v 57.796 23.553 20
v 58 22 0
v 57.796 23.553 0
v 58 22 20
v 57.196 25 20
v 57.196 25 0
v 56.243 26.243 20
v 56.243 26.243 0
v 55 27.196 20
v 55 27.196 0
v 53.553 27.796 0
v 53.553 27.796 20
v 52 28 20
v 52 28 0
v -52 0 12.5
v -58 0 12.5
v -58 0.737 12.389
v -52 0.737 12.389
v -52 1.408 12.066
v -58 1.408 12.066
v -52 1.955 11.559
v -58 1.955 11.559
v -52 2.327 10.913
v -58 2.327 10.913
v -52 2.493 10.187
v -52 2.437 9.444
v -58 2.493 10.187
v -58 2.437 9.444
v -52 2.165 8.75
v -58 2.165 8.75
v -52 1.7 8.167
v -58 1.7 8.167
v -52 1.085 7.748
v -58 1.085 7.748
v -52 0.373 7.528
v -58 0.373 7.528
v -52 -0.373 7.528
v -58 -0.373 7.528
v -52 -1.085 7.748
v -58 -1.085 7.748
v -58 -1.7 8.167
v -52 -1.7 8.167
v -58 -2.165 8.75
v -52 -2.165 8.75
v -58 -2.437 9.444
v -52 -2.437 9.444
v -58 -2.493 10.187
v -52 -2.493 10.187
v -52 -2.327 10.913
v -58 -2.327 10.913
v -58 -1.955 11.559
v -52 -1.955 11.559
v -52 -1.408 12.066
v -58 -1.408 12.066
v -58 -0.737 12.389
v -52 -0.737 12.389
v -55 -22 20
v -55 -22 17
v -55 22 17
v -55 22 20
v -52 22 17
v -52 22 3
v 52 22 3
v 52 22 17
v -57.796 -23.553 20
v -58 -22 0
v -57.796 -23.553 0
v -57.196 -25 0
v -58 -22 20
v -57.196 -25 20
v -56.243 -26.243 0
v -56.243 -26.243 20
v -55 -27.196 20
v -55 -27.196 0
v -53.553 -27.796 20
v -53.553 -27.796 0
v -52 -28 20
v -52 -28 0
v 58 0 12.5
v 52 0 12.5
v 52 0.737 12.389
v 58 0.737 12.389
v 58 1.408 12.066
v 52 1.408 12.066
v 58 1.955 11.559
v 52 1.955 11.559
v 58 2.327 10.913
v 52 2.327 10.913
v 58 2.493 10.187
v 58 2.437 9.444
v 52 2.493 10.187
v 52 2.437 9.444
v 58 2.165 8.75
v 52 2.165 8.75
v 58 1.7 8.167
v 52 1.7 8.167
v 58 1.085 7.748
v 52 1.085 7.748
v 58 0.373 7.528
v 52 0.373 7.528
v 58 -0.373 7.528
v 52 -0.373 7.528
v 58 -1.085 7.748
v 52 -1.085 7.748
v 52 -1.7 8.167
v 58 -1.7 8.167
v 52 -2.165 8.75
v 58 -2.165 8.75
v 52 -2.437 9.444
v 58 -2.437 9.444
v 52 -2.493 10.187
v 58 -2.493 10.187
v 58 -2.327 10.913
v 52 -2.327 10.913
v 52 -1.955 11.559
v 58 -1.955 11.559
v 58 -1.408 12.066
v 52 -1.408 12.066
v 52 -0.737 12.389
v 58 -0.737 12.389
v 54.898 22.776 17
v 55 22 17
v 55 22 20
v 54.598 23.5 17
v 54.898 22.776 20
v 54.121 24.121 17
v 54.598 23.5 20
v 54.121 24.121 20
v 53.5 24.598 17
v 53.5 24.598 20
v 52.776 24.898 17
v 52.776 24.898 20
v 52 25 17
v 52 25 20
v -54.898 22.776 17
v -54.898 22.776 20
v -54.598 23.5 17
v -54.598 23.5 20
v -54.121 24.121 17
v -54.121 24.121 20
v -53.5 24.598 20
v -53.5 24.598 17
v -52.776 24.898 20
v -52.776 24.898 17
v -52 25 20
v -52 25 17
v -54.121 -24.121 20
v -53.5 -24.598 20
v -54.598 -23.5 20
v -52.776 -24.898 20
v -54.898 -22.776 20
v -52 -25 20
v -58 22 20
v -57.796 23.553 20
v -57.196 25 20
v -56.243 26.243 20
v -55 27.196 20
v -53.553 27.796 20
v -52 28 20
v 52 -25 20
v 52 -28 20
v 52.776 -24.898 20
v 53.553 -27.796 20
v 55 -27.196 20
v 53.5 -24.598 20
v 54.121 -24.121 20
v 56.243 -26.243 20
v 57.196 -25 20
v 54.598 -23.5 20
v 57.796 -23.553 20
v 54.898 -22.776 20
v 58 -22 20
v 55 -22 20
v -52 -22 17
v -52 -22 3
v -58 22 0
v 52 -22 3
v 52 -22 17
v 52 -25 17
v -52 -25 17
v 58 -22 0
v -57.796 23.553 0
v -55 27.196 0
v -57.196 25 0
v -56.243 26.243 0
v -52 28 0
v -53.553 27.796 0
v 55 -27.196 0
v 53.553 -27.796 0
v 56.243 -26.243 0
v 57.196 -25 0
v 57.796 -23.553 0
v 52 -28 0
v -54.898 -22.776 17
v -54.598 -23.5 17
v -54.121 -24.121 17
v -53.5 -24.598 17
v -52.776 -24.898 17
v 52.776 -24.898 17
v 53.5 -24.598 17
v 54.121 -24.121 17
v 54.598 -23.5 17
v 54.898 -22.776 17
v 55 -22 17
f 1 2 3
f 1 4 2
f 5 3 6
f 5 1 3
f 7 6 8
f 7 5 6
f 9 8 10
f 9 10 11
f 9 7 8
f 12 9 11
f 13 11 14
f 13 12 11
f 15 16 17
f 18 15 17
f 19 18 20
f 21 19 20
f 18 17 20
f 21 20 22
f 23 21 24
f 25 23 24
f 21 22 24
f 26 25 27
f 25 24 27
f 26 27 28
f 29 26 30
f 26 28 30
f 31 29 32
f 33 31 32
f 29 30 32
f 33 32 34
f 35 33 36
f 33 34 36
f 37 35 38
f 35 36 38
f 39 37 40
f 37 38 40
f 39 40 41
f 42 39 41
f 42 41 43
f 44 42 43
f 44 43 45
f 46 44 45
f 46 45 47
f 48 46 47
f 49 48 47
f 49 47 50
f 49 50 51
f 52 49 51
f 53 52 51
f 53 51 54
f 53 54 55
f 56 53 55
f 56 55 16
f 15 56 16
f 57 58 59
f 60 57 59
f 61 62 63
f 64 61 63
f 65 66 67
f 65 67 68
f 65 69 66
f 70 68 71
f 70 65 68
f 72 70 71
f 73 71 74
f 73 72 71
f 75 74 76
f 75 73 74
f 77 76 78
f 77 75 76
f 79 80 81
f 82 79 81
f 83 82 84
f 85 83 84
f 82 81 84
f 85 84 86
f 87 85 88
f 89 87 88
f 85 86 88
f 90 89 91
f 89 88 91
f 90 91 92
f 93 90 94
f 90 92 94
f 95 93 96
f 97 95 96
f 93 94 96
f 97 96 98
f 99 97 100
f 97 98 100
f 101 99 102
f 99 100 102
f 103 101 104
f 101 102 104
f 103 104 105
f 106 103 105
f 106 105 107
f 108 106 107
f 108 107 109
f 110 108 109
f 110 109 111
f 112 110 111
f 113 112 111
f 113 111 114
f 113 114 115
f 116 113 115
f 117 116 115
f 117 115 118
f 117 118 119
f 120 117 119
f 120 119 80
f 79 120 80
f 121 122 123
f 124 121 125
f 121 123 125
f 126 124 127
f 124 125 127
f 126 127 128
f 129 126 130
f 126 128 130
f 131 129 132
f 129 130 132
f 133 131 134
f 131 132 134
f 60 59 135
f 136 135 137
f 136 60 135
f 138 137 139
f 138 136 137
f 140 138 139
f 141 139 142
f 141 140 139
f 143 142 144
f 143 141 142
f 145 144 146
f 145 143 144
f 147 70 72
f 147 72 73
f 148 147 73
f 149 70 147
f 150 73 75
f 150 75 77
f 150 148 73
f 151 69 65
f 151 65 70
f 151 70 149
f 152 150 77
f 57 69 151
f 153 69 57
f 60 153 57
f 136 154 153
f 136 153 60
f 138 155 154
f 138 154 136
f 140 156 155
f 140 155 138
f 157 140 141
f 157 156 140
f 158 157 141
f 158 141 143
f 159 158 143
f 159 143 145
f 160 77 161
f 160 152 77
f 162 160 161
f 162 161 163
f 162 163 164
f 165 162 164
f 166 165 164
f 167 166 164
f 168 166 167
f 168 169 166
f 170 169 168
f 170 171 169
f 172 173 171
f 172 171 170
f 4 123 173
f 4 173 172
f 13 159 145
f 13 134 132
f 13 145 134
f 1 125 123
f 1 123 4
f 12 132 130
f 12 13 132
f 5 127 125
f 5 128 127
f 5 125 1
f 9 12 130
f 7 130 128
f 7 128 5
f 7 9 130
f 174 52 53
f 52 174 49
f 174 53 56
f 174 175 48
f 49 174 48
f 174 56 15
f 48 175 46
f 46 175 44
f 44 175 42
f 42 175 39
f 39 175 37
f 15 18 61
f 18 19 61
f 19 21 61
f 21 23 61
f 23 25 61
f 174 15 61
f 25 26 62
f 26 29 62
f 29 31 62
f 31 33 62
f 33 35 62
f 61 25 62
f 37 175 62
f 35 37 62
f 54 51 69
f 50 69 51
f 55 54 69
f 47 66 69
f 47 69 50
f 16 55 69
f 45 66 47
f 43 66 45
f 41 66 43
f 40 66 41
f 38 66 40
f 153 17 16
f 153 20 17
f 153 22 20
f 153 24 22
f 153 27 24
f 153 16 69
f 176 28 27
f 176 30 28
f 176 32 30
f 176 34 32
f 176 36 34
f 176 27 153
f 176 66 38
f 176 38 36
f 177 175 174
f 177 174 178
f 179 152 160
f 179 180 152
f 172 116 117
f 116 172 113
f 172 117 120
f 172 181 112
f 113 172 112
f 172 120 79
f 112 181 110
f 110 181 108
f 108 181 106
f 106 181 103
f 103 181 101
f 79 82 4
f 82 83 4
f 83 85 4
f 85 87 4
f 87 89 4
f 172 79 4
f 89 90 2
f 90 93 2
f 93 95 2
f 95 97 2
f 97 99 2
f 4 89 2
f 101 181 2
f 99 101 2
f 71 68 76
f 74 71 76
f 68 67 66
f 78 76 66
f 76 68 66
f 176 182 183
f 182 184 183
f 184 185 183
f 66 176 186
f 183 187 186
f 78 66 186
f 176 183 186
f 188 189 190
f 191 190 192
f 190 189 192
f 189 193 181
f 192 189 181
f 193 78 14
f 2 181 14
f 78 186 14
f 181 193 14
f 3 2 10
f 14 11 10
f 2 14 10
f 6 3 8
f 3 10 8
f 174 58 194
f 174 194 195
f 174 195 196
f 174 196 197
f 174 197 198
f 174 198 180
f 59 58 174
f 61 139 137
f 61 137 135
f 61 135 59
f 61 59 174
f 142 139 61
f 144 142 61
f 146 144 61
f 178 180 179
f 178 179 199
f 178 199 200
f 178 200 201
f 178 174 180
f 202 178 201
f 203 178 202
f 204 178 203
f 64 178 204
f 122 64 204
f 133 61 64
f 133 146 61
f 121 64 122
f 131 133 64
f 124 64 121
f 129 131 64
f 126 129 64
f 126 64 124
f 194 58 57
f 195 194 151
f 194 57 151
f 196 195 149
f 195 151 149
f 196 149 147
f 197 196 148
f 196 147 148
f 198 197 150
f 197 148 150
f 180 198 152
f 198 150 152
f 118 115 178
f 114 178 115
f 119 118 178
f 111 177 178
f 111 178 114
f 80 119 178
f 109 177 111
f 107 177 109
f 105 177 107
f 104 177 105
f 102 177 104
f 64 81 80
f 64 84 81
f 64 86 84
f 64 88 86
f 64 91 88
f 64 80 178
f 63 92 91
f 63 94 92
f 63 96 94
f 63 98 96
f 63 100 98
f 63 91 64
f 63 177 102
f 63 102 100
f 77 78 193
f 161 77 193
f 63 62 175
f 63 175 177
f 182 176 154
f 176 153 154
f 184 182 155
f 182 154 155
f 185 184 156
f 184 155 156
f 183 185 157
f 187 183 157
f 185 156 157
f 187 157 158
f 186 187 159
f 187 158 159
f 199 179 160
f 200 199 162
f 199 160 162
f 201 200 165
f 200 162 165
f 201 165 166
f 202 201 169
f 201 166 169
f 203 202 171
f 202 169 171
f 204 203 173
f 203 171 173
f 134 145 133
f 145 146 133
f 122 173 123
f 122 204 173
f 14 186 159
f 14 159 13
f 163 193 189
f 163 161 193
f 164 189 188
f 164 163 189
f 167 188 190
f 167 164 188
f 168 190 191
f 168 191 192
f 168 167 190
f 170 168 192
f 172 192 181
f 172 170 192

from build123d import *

# Parameters (mm, degrees)
ESQUISSE1_W             = 116
ESQUISSE1_H             = 56
BOSS_EXTRU_1_DEPTH      = 20
CONG_1_R                = 6
COQUE1_T                = -3
ESQUISSE2_W             = 104
ESQUISSE2_H             = 44
BOSS_EXTRU_2_DEPTH      = 14
ESQUISSE3_R             = 2.5
ENL_V_MAT_EXTRU_1_DEPTH = 121.995867698


with BuildPart() as part:
    # Esquisse1 → Boss.-Extru.1 (new body)
    with BuildSketch(Plane.XY):
        Rectangle(ESQUISSE1_W, ESQUISSE1_H)
    extrude(amount=BOSS_EXTRU_1_DEPTH)

    # Congé1
    cong_1_edges = [part.edges().sort_by_distance(p)[0] for p in [
        (58, -28, 10),
        (-58, -28, 10),
        (-58, 28, 10),
        (58, 28, 10),
    ]]
    fillet(cong_1_edges, radius=CONG_1_R)

    # Coque1
    coque1_openings = [part.faces().sort_by_distance(p)[0] for p in [
        (0, 0, 20),
    ]]
    offset(amount=COQUE1_T, openings=coque1_openings, kind=Kind.INTERSECTION)

    # Esquisse2 → Boss.-Extru.2 (add)
    with BuildSketch(Plane.XY.offset(3)):
        with BuildLine():
            Line((52, 25), (-52, 25))
            ThreePointArc((-52, 25), (-54.121320344, 24.121320344), (-55, 22))
            Line((-55, 22), (-55, -22))
            ThreePointArc((-55, -22), (-54.121320344, -24.121320344), (-52, -25))
            Line((-52, -25), (52, -25))
            ThreePointArc((52, -25), (54.121320344, -24.121320344), (55, -22))
            Line((55, -22), (55, 22))
            ThreePointArc((55, 22), (54.121320344, 24.121320344), (52, 25))
        make_face()
        Rectangle(ESQUISSE2_W, ESQUISSE2_H, mode=Mode.SUBTRACT)
    extrude(amount=BOSS_EXTRU_2_DEPTH)

    # Esquisse3 → Enlèv. mat.-Extru.1 (cut, through all)
    with BuildSketch(Plane.ZY.offset(58)):
        with Locations((10, 0)):
            Circle(ESQUISSE3_R)
    extrude(amount=-ENL_V_MAT_EXTRU_1_DEPTH, mode=Mode.SUBTRACT)


solid = part.part
